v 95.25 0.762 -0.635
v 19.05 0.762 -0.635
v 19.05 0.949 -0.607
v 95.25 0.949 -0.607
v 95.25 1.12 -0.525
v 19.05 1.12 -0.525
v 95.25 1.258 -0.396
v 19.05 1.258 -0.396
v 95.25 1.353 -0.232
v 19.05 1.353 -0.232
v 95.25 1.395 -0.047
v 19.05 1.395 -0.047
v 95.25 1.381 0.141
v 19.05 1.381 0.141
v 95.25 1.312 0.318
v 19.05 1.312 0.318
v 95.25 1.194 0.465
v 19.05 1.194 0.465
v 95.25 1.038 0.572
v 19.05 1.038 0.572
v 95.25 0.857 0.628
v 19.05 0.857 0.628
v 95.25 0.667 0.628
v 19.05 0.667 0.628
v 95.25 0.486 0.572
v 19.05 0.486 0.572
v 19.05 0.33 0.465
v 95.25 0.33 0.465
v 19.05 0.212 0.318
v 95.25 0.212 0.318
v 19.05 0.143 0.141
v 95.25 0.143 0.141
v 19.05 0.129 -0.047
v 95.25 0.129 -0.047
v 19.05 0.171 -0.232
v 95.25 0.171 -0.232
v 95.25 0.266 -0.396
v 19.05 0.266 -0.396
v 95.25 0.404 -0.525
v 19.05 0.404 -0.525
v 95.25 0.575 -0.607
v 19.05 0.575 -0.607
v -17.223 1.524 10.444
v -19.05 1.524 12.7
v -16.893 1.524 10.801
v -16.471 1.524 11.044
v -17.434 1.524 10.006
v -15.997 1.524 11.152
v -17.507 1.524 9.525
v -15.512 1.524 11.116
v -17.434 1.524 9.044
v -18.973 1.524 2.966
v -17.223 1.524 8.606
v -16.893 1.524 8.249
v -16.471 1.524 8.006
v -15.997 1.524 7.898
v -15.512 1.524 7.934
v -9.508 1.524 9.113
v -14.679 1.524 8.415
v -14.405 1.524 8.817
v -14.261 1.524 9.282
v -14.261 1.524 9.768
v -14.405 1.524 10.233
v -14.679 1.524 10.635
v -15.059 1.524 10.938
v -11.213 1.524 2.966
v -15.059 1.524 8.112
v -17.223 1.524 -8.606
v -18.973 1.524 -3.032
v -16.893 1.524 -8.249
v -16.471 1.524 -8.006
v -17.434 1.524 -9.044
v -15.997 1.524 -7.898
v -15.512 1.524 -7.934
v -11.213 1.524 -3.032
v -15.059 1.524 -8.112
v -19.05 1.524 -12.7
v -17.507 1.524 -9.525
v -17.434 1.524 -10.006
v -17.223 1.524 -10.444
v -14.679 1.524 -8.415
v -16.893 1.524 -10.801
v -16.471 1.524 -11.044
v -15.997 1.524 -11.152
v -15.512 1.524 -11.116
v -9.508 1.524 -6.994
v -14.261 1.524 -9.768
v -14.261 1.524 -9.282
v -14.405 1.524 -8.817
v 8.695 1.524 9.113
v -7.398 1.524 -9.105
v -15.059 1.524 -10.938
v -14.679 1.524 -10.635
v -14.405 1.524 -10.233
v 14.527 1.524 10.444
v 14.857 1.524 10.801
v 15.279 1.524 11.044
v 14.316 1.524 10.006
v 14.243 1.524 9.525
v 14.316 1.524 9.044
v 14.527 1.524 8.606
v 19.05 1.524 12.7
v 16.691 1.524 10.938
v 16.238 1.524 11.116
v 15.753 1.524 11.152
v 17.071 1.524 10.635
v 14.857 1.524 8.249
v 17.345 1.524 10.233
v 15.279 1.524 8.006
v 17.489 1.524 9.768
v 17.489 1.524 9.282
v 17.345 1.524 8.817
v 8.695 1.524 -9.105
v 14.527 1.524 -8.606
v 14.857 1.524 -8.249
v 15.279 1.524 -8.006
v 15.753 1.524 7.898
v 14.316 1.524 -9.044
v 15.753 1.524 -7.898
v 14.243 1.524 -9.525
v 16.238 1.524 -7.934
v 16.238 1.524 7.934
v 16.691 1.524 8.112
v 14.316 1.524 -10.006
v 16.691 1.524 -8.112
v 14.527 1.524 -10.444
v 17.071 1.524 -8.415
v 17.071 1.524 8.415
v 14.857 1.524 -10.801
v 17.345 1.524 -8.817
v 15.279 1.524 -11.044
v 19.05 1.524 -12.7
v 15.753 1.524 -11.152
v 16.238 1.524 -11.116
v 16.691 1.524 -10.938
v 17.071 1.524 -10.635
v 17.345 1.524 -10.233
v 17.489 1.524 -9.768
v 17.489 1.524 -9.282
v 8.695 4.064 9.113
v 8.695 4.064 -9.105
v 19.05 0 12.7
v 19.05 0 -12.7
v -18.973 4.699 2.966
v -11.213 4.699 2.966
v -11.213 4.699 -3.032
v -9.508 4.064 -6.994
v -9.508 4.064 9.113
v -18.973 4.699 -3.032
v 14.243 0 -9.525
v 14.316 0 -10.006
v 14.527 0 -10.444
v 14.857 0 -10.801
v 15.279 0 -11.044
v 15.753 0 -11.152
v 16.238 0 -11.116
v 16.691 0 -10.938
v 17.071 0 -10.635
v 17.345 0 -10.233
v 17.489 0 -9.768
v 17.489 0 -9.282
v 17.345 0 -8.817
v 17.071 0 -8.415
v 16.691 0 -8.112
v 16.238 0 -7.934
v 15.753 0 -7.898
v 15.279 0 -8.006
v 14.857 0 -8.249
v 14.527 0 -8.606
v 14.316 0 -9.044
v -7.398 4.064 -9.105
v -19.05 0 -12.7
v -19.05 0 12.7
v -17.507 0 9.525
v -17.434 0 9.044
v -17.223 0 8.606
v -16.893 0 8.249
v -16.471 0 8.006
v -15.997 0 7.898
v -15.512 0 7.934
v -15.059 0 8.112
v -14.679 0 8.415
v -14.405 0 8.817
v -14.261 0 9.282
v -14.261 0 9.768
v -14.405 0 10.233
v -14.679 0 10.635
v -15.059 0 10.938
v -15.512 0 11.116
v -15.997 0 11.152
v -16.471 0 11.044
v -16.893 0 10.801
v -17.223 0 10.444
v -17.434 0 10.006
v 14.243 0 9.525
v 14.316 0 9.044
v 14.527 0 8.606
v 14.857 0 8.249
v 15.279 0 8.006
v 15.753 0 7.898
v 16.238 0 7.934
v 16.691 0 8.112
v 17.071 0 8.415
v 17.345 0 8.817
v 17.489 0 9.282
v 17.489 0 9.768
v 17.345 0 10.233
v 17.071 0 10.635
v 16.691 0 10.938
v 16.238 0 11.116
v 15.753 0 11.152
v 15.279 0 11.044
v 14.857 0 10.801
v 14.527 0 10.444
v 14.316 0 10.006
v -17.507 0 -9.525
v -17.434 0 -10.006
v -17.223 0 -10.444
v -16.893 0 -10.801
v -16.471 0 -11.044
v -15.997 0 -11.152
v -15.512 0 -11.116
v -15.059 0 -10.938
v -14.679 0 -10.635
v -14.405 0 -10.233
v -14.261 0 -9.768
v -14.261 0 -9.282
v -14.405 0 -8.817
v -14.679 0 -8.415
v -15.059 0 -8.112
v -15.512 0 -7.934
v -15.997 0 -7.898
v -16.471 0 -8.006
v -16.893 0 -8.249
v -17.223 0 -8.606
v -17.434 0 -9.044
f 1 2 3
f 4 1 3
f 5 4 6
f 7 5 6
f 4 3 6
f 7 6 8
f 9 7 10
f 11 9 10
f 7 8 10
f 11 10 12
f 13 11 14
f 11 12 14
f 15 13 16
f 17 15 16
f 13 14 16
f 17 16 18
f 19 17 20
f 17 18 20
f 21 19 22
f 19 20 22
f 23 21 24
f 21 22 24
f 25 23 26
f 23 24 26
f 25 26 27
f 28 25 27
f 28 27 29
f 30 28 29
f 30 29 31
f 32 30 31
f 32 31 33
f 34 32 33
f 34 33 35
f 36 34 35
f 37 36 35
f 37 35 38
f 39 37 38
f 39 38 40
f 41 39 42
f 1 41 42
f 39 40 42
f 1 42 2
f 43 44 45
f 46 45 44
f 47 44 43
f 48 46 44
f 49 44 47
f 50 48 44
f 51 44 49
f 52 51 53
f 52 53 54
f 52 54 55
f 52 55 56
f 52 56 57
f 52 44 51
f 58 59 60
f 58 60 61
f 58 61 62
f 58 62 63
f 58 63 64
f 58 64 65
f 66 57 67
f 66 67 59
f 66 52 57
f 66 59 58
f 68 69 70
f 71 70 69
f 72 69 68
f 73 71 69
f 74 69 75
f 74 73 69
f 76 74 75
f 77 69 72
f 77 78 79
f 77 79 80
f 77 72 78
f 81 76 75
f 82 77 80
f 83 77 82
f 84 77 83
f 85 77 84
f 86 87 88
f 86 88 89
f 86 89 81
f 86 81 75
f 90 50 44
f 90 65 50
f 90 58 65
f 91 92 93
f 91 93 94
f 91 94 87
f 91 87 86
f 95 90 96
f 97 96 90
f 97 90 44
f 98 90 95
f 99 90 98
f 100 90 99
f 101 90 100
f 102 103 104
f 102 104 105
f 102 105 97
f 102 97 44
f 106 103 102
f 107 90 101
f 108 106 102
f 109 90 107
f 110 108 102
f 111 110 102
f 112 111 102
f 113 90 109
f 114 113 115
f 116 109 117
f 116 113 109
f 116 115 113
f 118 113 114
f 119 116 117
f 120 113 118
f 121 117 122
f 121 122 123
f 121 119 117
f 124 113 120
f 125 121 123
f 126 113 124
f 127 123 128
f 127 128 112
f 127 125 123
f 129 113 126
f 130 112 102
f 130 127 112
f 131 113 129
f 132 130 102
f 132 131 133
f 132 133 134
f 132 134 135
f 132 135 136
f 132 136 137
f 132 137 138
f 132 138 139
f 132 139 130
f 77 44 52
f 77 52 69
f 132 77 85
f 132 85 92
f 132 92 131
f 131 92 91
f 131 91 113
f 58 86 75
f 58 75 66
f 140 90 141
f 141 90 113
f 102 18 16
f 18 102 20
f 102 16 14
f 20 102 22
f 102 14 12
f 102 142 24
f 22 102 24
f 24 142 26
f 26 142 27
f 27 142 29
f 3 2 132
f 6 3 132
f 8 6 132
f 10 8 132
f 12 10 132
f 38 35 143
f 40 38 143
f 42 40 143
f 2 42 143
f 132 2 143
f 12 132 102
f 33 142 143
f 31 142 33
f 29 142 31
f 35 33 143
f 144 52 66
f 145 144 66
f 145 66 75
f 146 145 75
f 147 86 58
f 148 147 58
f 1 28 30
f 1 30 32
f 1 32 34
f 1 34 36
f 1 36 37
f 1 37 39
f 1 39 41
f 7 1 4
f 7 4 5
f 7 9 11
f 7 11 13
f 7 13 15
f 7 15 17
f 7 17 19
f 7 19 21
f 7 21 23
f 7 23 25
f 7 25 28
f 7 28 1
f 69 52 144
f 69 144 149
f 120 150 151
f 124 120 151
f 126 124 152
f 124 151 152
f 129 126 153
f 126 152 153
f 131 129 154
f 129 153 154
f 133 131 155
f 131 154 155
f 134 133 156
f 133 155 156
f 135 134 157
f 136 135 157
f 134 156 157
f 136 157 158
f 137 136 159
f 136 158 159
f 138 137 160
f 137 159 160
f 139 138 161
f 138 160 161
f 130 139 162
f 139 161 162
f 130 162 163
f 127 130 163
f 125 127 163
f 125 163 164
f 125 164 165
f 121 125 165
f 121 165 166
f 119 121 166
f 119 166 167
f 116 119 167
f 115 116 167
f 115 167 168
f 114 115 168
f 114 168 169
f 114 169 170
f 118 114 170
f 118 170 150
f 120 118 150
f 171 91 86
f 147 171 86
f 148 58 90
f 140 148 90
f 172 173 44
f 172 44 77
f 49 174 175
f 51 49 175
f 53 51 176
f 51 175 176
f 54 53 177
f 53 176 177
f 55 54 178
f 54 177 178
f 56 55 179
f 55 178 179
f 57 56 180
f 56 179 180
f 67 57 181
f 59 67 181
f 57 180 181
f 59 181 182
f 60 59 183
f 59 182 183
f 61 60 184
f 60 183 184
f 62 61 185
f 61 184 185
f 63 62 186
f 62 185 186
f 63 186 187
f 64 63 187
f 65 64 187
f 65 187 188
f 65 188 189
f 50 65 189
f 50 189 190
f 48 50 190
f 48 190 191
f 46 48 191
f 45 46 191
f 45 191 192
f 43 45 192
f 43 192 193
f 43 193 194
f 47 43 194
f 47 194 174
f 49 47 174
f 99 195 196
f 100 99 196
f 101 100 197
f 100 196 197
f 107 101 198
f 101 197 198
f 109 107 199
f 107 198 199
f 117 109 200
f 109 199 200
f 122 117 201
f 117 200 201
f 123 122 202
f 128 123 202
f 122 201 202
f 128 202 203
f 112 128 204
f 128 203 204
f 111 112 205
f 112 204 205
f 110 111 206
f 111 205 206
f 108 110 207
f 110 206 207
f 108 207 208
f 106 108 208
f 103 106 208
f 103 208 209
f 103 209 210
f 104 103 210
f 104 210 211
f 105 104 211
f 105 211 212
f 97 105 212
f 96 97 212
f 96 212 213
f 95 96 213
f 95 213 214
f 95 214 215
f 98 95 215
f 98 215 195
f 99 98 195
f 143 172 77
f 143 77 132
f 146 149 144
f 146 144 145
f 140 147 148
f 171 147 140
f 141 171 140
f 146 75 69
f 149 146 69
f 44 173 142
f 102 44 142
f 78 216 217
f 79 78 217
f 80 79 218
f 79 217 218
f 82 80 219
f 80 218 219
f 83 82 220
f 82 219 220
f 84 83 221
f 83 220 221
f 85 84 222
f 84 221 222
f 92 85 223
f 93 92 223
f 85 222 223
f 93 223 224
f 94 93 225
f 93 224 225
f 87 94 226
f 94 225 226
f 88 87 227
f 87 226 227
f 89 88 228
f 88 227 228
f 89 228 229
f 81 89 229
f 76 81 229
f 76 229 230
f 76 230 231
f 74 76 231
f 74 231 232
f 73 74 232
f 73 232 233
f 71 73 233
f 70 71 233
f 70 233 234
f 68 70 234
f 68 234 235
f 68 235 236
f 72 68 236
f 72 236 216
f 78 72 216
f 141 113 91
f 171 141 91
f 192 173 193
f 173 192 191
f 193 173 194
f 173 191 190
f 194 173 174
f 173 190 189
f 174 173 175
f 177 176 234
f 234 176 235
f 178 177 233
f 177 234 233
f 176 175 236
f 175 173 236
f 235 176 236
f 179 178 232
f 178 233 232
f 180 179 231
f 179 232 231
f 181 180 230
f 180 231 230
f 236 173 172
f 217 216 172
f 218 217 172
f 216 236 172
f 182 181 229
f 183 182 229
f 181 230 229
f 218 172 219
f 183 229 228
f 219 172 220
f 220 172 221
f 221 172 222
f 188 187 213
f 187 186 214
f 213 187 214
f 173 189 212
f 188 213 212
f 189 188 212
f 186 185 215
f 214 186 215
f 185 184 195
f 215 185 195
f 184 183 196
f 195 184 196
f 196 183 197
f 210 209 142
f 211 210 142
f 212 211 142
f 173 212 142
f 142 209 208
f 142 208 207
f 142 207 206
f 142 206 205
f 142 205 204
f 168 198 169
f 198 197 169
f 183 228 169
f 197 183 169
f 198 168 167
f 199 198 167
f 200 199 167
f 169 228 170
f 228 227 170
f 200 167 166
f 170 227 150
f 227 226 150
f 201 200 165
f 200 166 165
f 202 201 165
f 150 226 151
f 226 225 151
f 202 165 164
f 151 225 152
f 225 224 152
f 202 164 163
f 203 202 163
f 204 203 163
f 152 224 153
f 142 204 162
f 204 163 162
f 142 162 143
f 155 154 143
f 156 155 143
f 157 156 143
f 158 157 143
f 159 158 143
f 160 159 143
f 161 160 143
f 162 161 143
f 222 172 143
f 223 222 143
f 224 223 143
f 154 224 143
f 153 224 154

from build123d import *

# Parameters (mm, degrees)
SKETCH1_W             = 38.1
SKETCH1_H             = 25.4
BOSS_EXTRUDE1_DEPTH   = 1.524
F_4_CLEARANCE_HOLE1_D = 3.2639
BOSS_EXTRUDE2_DEPTH   = 2.54
SKETCH2_3_W           = 7.759657213
SKETCH2_3_H           = 5.99739549
BOSS_EXTRUDE3_DEPTH   = 3.175
SKETCH6_R             = 0.635
BOSS_EXTRUDE4_DEPTH   = 76.2


with BuildPart() as part:
    # Sketch1 → Boss-Extrude1 (new body)
    with BuildSketch(Plane(origin=(0, 0, 0), x_dir=(1, 0, 0), z_dir=(0, 1, 0))):
        Rectangle(SKETCH1_W, SKETCH1_H)
    extrude(amount=BOSS_EXTRUDE1_DEPTH)

    # #4 Clearance Hole1 (through all)
    with Locations(Plane(origin=(0, 1.524, 0), x_dir=(1, 0, 0), z_dir=(0, 1, 0))):
        with Locations((-15.875, 9.525), (15.875, 9.525), (15.875, -9.525), (-15.875, -9.525)):
            Hole(F_4_CLEARANCE_HOLE1_D / 2)

    # Sketch2 → Boss-Extrude2 (add)
    with BuildSketch(Plane(origin=(0, 1.524, 0), x_dir=(1, 0, 0), z_dir=(0, 1, 0))):
        Polygon((-9.50810694, -9.112699607), (8.695477597, -9.112699607), (8.695477597, 9.104771495), (-7.397734973, 9.104771495), (-9.50810694, 6.994399527), align=None)
    extrude(amount=BOSS_EXTRUDE2_DEPTH)

    # Sketch2<3> → Boss-Extrude3 (add)
    with BuildSketch(Plane(origin=(0, 1.524, 0), x_dir=(1, 0, 0), z_dir=(0, 1, 0))):
        with Locations((-15.092977225, 0.033144474)):
            Rectangle(SKETCH2_3_W, SKETCH2_3_H)
    extrude(amount=BOSS_EXTRUDE3_DEPTH)

    # Sketch6 → Boss-Extrude4 (add)
    with BuildSketch(Plane(origin=(19.05, 0, 0), x_dir=(0, 0, -1), z_dir=(1, 0, 0))):
        with Locations((0, 0.762)):
            Circle(SKETCH6_R)
    extrude(amount=BOSS_EXTRUDE4_DEPTH)


solid = part.part
